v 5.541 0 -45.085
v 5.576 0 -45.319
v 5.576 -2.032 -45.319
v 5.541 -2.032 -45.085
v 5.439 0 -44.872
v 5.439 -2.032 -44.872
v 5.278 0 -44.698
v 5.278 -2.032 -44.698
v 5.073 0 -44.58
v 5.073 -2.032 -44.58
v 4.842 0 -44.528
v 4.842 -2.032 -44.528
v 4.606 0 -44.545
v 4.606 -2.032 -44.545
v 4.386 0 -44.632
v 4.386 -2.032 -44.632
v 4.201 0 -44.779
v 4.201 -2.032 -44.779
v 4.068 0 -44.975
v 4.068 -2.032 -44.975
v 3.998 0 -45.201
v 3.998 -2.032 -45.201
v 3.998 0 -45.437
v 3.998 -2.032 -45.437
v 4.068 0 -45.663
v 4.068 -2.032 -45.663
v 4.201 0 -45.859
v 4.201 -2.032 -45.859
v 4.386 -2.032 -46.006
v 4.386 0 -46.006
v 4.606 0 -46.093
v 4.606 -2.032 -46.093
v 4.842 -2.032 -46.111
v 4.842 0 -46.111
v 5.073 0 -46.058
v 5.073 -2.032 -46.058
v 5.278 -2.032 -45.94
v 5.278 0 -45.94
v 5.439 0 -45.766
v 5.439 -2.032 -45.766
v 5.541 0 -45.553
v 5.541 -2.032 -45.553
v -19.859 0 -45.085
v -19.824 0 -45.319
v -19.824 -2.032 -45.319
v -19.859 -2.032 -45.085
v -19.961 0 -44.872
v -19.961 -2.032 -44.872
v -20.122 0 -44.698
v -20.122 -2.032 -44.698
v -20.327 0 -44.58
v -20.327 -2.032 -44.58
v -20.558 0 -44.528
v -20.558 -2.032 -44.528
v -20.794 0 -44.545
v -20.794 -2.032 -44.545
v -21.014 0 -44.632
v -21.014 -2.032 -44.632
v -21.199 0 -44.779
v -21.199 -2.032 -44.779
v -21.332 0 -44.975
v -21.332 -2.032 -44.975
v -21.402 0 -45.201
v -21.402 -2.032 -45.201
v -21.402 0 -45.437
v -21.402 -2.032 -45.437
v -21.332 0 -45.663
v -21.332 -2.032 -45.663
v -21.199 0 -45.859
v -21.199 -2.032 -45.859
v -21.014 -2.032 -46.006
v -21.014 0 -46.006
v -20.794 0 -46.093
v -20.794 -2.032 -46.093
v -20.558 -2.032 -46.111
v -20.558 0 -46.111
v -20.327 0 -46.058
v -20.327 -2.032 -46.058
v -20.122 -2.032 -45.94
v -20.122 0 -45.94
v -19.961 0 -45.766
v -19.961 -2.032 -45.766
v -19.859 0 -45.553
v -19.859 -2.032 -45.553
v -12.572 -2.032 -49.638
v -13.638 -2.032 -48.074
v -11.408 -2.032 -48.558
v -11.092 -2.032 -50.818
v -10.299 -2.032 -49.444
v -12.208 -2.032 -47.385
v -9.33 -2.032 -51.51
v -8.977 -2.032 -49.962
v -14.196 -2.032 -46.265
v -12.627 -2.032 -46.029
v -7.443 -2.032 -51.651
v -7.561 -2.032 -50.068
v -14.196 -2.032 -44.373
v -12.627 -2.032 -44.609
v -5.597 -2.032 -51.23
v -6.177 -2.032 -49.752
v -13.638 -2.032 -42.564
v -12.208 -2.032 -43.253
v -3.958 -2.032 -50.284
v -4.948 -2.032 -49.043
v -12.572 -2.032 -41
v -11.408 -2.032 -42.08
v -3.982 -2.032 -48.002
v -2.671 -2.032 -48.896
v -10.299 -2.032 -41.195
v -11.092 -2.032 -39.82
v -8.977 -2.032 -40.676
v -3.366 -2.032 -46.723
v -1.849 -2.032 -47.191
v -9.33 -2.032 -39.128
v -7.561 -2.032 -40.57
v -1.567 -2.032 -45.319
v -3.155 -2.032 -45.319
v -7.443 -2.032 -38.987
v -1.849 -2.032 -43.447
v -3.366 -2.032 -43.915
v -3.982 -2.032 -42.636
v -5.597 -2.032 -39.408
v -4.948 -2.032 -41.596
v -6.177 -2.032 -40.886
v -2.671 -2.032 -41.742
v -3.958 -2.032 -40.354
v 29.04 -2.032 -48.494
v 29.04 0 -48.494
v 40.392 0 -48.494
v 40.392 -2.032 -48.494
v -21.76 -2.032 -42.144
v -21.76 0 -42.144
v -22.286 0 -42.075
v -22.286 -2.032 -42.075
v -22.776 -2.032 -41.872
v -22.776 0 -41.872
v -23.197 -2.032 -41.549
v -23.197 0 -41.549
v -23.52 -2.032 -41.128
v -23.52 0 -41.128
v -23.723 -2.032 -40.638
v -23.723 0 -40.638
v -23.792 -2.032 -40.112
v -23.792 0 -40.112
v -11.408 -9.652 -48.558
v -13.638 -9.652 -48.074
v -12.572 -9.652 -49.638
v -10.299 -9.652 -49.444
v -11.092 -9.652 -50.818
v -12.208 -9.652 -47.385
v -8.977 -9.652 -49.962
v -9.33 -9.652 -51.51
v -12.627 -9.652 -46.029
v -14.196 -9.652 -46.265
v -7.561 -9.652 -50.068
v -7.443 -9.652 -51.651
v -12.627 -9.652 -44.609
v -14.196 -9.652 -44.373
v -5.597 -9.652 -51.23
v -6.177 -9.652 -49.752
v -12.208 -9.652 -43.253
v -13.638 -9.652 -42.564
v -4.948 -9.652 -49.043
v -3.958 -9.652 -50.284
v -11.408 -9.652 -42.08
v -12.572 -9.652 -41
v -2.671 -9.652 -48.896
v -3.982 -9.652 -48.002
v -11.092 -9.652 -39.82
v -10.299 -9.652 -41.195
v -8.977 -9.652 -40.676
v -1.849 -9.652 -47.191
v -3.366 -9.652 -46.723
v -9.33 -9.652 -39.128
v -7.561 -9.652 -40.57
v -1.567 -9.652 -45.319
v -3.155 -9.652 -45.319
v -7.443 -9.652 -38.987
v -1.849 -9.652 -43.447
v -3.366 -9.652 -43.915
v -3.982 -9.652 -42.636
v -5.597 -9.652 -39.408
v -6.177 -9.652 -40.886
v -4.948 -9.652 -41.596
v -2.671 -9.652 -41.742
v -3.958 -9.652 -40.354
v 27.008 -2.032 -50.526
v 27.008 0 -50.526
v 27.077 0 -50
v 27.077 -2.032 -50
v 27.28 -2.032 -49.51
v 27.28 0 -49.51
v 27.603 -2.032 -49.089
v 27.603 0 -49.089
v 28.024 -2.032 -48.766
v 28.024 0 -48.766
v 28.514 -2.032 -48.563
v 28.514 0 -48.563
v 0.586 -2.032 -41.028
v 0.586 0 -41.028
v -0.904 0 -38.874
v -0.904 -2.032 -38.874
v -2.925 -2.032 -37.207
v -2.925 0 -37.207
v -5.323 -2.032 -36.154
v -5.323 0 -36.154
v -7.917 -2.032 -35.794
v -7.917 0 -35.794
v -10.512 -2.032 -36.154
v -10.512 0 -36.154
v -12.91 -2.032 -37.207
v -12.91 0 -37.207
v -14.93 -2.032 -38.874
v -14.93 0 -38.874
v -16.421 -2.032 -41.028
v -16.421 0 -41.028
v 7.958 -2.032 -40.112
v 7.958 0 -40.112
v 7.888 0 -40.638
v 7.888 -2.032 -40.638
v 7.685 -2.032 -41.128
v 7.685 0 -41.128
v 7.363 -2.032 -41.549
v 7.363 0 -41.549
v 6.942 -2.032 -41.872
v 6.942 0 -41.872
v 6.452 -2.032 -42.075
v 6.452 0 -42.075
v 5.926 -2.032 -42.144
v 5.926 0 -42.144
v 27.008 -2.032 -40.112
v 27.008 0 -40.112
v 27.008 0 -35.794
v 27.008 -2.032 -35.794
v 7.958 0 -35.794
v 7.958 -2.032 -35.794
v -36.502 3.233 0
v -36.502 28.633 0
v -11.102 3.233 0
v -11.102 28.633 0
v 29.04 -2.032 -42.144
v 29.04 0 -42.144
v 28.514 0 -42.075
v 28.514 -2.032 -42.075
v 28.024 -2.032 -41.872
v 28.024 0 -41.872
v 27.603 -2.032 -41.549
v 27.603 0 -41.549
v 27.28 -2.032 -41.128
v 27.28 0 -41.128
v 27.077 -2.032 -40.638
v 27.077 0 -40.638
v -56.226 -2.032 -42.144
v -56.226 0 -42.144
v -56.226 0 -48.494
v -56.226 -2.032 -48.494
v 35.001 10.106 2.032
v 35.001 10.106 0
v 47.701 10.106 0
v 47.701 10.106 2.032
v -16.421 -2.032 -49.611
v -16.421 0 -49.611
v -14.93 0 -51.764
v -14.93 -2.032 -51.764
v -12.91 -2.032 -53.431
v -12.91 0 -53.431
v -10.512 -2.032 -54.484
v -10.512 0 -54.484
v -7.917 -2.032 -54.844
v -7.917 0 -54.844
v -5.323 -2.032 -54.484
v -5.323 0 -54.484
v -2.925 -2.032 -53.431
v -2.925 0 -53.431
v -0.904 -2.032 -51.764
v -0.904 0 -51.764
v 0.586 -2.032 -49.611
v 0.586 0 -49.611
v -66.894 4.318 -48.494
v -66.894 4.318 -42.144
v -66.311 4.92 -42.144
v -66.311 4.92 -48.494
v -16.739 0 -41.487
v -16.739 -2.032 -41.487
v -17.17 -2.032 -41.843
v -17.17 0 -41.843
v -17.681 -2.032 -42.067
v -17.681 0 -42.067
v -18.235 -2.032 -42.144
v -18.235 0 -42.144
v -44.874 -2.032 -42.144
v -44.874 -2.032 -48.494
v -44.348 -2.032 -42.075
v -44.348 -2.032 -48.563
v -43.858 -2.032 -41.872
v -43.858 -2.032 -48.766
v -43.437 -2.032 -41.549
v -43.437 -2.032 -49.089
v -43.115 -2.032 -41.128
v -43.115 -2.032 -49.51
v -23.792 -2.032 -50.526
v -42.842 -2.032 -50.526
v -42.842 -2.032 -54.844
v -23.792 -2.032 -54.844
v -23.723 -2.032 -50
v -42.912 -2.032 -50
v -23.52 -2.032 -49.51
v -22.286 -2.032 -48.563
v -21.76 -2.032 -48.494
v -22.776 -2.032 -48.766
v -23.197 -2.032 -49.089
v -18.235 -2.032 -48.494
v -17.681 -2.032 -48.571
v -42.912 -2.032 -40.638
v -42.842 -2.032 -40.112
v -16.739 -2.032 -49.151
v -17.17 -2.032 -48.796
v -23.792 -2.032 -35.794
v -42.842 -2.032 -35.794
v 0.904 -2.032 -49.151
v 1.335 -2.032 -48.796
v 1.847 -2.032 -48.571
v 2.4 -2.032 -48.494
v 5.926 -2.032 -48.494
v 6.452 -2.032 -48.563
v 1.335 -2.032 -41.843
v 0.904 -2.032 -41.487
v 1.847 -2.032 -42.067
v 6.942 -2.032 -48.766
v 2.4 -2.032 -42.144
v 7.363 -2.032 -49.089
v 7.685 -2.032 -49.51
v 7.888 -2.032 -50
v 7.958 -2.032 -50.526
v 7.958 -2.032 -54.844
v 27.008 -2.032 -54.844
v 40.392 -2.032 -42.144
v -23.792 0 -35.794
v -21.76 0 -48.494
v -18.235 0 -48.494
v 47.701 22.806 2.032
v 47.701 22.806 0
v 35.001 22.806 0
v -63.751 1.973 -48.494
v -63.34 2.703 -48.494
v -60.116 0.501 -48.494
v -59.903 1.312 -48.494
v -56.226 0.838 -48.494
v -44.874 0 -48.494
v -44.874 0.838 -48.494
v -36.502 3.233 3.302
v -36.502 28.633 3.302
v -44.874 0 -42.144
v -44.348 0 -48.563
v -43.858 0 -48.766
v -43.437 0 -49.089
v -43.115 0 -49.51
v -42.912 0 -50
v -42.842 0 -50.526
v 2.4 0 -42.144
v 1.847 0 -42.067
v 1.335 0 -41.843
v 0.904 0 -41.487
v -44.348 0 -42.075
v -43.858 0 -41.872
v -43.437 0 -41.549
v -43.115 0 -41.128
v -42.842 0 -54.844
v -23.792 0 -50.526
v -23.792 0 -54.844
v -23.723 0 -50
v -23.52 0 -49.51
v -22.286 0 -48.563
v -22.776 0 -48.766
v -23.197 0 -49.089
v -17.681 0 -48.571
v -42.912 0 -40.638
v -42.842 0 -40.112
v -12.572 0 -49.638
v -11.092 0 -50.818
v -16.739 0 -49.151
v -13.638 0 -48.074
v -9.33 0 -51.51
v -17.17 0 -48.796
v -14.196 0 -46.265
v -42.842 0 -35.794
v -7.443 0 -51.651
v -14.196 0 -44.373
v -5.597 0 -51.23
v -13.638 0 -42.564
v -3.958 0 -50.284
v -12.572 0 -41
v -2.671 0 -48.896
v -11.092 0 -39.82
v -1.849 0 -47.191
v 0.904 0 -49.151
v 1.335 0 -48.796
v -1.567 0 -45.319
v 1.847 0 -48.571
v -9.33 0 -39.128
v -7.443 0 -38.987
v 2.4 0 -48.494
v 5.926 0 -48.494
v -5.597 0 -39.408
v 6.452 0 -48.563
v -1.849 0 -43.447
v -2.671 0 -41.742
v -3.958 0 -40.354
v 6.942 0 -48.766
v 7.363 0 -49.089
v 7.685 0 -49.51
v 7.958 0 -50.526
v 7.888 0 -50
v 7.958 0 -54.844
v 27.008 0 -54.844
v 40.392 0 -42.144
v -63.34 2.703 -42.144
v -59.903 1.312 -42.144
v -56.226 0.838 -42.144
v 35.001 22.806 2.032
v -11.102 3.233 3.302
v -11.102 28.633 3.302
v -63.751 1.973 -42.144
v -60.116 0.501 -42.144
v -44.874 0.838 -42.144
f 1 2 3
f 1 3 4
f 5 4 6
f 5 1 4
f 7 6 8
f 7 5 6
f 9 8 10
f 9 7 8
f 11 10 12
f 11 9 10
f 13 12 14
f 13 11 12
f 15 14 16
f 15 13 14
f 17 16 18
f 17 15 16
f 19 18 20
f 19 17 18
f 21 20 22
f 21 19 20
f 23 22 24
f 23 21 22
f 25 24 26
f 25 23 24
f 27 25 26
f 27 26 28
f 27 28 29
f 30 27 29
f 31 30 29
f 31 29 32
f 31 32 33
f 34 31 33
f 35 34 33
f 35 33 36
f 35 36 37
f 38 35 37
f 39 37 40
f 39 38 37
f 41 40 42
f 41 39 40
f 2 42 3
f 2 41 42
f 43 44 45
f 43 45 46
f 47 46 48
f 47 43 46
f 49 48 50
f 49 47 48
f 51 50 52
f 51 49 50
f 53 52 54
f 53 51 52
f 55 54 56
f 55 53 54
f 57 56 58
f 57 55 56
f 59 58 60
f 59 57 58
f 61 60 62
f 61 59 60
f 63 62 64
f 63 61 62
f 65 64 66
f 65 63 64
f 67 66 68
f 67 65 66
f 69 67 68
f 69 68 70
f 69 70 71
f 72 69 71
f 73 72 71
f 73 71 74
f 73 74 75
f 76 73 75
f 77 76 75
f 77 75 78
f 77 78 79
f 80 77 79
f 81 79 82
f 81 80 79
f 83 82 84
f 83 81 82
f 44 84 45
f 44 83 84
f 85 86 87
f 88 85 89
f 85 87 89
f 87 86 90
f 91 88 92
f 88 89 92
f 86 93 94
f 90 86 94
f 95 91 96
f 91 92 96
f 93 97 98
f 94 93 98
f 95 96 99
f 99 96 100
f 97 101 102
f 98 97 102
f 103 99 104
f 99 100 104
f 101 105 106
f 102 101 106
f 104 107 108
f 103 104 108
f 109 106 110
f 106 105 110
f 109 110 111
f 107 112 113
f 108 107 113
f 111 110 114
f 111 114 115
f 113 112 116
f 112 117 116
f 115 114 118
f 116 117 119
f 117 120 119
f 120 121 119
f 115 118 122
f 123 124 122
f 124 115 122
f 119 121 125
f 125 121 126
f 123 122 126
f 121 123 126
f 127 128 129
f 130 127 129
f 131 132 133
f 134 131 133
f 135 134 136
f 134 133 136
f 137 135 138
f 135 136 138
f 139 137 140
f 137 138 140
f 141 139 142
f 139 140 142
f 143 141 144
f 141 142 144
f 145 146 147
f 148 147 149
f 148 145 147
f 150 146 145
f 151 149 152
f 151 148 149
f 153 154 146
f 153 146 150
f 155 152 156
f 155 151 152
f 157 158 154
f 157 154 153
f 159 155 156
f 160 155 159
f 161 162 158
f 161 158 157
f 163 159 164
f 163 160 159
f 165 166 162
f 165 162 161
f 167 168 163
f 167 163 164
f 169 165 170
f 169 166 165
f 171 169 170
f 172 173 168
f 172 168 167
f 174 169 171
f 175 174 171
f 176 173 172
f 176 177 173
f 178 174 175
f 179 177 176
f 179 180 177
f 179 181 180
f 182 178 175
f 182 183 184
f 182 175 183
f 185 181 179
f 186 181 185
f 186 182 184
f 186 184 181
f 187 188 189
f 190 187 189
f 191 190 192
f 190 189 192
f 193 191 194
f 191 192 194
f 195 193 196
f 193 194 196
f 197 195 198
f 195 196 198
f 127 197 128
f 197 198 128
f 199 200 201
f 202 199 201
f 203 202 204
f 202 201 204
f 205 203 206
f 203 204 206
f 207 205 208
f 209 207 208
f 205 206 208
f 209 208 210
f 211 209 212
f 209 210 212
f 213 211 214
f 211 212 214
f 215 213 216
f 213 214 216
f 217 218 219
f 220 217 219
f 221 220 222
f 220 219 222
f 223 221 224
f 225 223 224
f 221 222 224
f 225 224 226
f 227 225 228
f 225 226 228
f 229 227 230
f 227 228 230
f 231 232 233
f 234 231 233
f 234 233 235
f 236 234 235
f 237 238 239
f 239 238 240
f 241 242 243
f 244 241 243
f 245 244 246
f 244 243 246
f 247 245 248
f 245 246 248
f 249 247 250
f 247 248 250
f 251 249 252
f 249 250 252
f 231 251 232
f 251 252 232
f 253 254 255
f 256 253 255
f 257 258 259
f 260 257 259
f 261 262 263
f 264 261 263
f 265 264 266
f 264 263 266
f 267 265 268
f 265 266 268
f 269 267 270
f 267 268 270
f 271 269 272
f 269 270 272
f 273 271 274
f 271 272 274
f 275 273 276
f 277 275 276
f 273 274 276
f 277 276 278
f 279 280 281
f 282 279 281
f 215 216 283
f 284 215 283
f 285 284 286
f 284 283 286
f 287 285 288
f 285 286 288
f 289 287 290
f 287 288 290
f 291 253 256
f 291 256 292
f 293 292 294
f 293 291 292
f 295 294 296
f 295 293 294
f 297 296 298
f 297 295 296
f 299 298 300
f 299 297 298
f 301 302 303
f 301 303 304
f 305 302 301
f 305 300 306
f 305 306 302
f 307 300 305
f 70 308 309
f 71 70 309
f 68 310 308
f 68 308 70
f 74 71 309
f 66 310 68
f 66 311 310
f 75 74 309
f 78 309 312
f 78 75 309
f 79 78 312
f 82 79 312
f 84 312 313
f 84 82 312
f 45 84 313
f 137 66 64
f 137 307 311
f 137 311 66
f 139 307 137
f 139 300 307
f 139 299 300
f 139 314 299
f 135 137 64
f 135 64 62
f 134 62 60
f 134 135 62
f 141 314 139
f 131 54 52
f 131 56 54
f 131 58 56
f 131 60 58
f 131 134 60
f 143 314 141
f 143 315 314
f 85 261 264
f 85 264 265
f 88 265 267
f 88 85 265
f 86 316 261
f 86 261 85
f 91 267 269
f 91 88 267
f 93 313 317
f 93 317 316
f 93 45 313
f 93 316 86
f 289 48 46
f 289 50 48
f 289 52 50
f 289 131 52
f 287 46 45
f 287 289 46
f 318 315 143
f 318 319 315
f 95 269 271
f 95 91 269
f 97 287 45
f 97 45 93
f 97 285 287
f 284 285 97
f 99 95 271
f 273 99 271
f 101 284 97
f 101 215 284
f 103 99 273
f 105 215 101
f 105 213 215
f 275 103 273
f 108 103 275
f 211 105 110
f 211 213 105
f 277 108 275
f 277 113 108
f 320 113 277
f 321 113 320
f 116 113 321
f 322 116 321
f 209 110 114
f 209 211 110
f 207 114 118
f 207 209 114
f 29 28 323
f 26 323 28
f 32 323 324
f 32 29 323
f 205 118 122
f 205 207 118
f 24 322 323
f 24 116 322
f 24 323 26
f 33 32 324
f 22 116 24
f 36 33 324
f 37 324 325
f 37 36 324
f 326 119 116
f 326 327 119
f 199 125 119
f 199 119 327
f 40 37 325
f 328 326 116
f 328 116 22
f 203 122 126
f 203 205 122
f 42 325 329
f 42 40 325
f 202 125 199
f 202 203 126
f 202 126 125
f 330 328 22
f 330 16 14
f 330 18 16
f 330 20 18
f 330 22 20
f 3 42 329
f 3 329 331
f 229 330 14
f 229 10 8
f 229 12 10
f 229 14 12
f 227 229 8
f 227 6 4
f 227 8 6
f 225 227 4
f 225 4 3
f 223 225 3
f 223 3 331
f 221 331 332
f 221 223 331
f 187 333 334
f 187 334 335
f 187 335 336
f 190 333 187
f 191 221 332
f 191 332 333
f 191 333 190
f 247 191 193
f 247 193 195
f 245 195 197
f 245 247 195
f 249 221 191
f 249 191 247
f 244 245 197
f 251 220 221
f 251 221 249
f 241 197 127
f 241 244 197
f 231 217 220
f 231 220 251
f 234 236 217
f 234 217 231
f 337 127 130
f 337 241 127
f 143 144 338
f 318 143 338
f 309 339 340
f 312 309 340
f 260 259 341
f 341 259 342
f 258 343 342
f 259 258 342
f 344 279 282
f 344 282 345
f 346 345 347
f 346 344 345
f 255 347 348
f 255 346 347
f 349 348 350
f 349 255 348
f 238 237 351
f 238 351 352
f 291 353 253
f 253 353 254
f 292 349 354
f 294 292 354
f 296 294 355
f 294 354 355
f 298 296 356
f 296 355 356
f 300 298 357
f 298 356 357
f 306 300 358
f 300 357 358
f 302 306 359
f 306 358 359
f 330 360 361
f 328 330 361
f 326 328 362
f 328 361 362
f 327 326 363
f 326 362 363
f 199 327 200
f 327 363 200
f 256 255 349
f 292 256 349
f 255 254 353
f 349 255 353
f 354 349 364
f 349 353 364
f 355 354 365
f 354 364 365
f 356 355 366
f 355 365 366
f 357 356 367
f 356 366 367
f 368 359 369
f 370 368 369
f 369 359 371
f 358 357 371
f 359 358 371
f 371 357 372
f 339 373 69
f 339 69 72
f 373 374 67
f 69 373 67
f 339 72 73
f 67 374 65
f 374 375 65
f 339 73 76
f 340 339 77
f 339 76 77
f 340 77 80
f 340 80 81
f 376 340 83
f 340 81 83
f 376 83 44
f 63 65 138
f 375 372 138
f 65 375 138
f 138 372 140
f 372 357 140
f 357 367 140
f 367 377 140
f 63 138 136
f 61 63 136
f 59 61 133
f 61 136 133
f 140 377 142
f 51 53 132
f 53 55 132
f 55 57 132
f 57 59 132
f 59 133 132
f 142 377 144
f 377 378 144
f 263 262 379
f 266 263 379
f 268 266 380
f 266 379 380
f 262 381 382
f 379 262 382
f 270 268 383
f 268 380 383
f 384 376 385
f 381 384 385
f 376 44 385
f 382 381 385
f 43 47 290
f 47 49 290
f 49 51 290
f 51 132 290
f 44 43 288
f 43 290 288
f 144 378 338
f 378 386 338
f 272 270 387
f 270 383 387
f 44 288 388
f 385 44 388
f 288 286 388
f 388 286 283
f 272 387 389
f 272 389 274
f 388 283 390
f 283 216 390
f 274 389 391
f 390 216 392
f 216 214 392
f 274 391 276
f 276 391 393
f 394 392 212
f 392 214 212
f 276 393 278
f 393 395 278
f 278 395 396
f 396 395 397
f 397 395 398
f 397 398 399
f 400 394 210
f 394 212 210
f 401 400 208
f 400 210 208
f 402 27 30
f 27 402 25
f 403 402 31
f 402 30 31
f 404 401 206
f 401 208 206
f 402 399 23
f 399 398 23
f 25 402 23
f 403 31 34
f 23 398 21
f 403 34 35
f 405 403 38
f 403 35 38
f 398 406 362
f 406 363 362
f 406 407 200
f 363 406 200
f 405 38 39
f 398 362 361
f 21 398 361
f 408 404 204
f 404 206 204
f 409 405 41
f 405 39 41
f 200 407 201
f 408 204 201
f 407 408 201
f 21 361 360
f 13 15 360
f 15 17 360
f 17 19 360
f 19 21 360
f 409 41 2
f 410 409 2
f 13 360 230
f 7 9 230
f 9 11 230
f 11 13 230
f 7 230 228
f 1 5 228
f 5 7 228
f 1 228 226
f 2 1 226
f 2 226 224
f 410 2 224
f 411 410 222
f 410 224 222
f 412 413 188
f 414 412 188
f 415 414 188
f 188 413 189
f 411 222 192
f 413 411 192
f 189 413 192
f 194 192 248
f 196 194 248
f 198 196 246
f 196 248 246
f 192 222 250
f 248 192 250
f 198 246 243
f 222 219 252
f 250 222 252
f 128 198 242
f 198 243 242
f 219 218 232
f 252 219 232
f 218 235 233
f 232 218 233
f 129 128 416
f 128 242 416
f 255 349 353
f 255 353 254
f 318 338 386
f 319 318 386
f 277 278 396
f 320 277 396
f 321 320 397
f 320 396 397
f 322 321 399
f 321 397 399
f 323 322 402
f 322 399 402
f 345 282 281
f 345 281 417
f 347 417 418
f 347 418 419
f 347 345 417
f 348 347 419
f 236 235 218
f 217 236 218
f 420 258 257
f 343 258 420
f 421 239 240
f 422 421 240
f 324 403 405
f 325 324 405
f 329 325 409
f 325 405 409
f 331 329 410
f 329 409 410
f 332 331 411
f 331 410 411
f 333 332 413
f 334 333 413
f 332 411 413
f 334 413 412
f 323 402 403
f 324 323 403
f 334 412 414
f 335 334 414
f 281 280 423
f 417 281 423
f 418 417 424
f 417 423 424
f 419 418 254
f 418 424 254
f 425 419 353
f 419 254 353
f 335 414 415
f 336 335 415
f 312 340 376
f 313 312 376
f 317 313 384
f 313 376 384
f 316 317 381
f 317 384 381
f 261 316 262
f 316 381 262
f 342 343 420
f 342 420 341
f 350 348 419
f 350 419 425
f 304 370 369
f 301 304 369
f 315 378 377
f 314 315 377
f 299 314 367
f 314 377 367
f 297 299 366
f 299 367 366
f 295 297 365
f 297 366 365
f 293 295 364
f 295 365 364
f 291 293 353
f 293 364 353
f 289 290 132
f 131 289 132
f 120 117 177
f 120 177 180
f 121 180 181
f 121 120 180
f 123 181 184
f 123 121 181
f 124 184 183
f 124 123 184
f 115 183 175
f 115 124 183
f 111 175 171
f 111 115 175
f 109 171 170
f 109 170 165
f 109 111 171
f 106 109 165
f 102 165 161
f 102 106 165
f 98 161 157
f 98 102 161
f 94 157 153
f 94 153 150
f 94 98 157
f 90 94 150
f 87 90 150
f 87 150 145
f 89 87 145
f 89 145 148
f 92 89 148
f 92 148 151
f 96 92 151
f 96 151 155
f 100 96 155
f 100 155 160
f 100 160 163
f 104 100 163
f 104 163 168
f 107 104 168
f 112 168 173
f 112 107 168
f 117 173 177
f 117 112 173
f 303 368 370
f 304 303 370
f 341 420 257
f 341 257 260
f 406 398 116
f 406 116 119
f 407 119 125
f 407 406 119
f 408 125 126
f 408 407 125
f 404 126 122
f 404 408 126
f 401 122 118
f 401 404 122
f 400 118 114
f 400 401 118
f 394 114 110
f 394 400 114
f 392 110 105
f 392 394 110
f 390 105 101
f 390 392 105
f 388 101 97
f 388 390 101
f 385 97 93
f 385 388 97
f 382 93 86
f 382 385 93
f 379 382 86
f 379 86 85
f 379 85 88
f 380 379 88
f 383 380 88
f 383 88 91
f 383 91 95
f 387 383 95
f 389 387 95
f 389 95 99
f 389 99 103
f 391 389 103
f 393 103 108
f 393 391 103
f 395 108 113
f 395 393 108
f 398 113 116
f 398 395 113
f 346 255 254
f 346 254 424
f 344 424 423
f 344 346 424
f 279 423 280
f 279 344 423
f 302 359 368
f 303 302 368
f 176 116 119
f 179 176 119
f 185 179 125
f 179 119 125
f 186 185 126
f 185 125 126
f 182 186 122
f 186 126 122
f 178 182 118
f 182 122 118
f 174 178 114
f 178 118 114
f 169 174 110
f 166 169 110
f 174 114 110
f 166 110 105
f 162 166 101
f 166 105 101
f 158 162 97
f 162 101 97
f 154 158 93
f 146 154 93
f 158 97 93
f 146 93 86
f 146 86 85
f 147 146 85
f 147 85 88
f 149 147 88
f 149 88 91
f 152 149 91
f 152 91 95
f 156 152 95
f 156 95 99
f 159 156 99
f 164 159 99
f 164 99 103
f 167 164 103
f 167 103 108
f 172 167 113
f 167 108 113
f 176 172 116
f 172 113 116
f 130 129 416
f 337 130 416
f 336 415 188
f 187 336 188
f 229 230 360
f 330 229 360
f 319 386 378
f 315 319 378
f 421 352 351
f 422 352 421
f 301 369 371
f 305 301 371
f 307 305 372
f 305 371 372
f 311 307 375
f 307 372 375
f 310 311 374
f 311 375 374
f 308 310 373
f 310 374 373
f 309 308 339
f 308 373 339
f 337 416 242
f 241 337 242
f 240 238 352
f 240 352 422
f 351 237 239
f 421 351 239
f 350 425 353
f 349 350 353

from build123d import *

# Parameters (mm, degrees)
F0_W      = 25.4
F0_H      = 25.4
F1_DEPTH  = 3.302
F2_W      = 12.7
F2_H      = 12.7
F3_DEPTH  = 2.032
F4_R      = 0.79375
F4_R_2    = 6.35
F5_DEPTH  = 2.032
F7_DEPTH  = 6.35
F8_R      = 0.254
F9_DEPTH  = 15.875
F10_R     = 6.35
F10_R_2   = 4.7625
F11_DEPTH = 7.62


with BuildPart() as f1:
    # F0 (on Top) → F1 (new body)
    with BuildSketch(Plane.XY):
        with Locations((-23.801553, 15.933108)):
            Rectangle(F0_W, F0_H)
    extrude(amount=F1_DEPTH)


with BuildPart() as f3:
    # F2 (on Top) → F3 (new body)
    with BuildSketch(Plane.XY):
        with Locations((41.351084, 16.456318)):
            Rectangle(F2_W, F2_H)
    extrude(amount=F3_DEPTH)


with BuildPart() as f5:
    # F4 (on Front) → F5 (new body)
    with BuildSketch(Plane.XZ):
        with BuildLine():
            Line((-44.87432, -42.144069), (-56.226311, -42.144069))
            Line((-56.226311, -42.144069), (-56.226311, -48.494069))
            Line((-56.226311, -48.494069), (-44.87432, -48.494069))
            ThreePointArc((-44.87432, -48.494069), (-43.437479, -49.089228), (-42.84232, -50.526069))
            Line((-42.84232, -50.526069), (-42.84232, -54.844069))
            Line((-42.84232, -54.844069), (-23.79232, -54.844069))
            Line((-23.79232, -54.844069), (-23.79232, -50.526069))
            ThreePointArc((-23.79232, -50.526069), (-23.197161, -49.089228), (-21.76032, -48.494069))
            Line((-21.76032, -48.494069), (-18.234849, -48.494069))
            ThreePointArc((-18.234849, -48.494069), (-17.169791, -48.795556), (-16.420778, -49.610553))
            ThreePointArc((-16.420778, -49.610553), (-7.91732, -54.844069), (0.586138, -49.610553))
            ThreePointArc((0.586138, -49.610553), (1.335151, -48.795556), (2.400209, -48.494069))
            Line((2.400209, -48.494069), (5.92568, -48.494069))
            ThreePointArc((5.92568, -48.494069), (7.362521, -49.089228), (7.95768, -50.526069))
            Line((7.95768, -50.526069), (7.95768, -54.844069))
            Line((7.95768, -54.844069), (27.00768, -54.844069))
            Line((27.00768, -54.844069), (27.00768, -50.526069))
            ThreePointArc((27.00768, -50.526069), (27.602839, -49.089228), (29.03968, -48.494069))
            Line((29.03968, -48.494069), (40.391671, -48.494069))
            Line((40.391671, -48.494069), (40.391671, -42.144069))
            Line((40.391671, -42.144069), (29.03968, -42.144069))
            ThreePointArc((29.03968, -42.144069), (27.602839, -41.54891), (27.00768, -40.112069))
            Line((27.00768, -40.112069), (27.00768, -35.794069))
            Line((27.00768, -35.794069), (7.95768, -35.794069))
            Line((7.95768, -35.794069), (7.95768, -40.112069))
            ThreePointArc((7.95768, -40.112069), (7.362521, -41.54891), (5.92568, -42.144069))
            Line((5.92568, -42.144069), (2.400209, -42.144069))
            ThreePointArc((2.400209, -42.144069), (1.335151, -41.842582), (0.586138, -41.027586))
            ThreePointArc((0.586138, -41.027586), (-7.91732, -35.794069), (-16.420778, -41.027586))
            ThreePointArc((-16.420778, -41.027586), (-17.169791, -41.842582), (-18.234849, -42.144069))
            Line((-18.234849, -42.144069), (-21.76032, -42.144069))
            ThreePointArc((-21.76032, -42.144069), (-23.197161, -41.54891), (-23.79232, -40.112069))
            Line((-23.79232, -40.112069), (-23.79232, -35.794069))
            Line((-23.79232, -35.794069), (-42.84232, -35.794069))
            Line((-42.84232, -35.794069), (-42.84232, -40.112069))
            ThreePointArc((-42.84232, -40.112069), (-43.437479, -41.54891), (-44.87432, -42.144069))
        make_face()
        with Locations((-20.61732, -45.319069)):
            Circle(F4_R, mode=Mode.SUBTRACT)
        with Locations((-7.91732, -45.319069)):
            Circle(F4_R_2, mode=Mode.SUBTRACT)
        with Locations((4.78268, -45.319069)):
            Circle(F4_R, mode=Mode.SUBTRACT)
    extrude(amount=F5_DEPTH)


with BuildPart() as f7:
    # F6 (on face) → F7 (new body)
    with BuildSketch(Plane(origin=(0, 0, -48.494069), x_dir=(1, 0, 0), z_dir=(0, 0, -1))):
        with BuildLine():
            Line((-44.87432, -0.8382), (-44.87432, 0))
            Line((-44.87432, 0), (-56.226311, 0))
            ThreePointArc((-56.226311, 0), (-61.980686, -1.120425), (-66.894311, -4.318))
            Line((-66.894311, -4.318), (-66.311286, -4.920214))
            ThreePointArc((-66.311286, -4.920214), (-61.6662, -1.897392), (-56.226311, -0.8382))
            Line((-56.226311, -0.8382), (-44.87432, -0.8382))
        make_face()
    extrude(amount=-F7_DEPTH)


with BuildPart() as f9:
    # F8 (on Top) → F9 (new body)
    with BuildSketch(Plane.XY):
        with Locations((7.016313, 0)):
            Circle(F8_R)
    extrude(amount=F9_DEPTH)


with BuildPart() as f11:
    # F10 (on face) → F11 (new body)
    with BuildSketch(Plane.XZ.offset(2.032)):
        with Locations((-7.91732, -45.319069)):
            Circle(F10_R)
        with Locations((-7.91732, -45.319069)):
            Circle(F10_R_2, mode=Mode.SUBTRACT)
    extrude(amount=F11_DEPTH)


solid = Compound([f1.part, f3.part, f5.part, f7.part, f11.part])
